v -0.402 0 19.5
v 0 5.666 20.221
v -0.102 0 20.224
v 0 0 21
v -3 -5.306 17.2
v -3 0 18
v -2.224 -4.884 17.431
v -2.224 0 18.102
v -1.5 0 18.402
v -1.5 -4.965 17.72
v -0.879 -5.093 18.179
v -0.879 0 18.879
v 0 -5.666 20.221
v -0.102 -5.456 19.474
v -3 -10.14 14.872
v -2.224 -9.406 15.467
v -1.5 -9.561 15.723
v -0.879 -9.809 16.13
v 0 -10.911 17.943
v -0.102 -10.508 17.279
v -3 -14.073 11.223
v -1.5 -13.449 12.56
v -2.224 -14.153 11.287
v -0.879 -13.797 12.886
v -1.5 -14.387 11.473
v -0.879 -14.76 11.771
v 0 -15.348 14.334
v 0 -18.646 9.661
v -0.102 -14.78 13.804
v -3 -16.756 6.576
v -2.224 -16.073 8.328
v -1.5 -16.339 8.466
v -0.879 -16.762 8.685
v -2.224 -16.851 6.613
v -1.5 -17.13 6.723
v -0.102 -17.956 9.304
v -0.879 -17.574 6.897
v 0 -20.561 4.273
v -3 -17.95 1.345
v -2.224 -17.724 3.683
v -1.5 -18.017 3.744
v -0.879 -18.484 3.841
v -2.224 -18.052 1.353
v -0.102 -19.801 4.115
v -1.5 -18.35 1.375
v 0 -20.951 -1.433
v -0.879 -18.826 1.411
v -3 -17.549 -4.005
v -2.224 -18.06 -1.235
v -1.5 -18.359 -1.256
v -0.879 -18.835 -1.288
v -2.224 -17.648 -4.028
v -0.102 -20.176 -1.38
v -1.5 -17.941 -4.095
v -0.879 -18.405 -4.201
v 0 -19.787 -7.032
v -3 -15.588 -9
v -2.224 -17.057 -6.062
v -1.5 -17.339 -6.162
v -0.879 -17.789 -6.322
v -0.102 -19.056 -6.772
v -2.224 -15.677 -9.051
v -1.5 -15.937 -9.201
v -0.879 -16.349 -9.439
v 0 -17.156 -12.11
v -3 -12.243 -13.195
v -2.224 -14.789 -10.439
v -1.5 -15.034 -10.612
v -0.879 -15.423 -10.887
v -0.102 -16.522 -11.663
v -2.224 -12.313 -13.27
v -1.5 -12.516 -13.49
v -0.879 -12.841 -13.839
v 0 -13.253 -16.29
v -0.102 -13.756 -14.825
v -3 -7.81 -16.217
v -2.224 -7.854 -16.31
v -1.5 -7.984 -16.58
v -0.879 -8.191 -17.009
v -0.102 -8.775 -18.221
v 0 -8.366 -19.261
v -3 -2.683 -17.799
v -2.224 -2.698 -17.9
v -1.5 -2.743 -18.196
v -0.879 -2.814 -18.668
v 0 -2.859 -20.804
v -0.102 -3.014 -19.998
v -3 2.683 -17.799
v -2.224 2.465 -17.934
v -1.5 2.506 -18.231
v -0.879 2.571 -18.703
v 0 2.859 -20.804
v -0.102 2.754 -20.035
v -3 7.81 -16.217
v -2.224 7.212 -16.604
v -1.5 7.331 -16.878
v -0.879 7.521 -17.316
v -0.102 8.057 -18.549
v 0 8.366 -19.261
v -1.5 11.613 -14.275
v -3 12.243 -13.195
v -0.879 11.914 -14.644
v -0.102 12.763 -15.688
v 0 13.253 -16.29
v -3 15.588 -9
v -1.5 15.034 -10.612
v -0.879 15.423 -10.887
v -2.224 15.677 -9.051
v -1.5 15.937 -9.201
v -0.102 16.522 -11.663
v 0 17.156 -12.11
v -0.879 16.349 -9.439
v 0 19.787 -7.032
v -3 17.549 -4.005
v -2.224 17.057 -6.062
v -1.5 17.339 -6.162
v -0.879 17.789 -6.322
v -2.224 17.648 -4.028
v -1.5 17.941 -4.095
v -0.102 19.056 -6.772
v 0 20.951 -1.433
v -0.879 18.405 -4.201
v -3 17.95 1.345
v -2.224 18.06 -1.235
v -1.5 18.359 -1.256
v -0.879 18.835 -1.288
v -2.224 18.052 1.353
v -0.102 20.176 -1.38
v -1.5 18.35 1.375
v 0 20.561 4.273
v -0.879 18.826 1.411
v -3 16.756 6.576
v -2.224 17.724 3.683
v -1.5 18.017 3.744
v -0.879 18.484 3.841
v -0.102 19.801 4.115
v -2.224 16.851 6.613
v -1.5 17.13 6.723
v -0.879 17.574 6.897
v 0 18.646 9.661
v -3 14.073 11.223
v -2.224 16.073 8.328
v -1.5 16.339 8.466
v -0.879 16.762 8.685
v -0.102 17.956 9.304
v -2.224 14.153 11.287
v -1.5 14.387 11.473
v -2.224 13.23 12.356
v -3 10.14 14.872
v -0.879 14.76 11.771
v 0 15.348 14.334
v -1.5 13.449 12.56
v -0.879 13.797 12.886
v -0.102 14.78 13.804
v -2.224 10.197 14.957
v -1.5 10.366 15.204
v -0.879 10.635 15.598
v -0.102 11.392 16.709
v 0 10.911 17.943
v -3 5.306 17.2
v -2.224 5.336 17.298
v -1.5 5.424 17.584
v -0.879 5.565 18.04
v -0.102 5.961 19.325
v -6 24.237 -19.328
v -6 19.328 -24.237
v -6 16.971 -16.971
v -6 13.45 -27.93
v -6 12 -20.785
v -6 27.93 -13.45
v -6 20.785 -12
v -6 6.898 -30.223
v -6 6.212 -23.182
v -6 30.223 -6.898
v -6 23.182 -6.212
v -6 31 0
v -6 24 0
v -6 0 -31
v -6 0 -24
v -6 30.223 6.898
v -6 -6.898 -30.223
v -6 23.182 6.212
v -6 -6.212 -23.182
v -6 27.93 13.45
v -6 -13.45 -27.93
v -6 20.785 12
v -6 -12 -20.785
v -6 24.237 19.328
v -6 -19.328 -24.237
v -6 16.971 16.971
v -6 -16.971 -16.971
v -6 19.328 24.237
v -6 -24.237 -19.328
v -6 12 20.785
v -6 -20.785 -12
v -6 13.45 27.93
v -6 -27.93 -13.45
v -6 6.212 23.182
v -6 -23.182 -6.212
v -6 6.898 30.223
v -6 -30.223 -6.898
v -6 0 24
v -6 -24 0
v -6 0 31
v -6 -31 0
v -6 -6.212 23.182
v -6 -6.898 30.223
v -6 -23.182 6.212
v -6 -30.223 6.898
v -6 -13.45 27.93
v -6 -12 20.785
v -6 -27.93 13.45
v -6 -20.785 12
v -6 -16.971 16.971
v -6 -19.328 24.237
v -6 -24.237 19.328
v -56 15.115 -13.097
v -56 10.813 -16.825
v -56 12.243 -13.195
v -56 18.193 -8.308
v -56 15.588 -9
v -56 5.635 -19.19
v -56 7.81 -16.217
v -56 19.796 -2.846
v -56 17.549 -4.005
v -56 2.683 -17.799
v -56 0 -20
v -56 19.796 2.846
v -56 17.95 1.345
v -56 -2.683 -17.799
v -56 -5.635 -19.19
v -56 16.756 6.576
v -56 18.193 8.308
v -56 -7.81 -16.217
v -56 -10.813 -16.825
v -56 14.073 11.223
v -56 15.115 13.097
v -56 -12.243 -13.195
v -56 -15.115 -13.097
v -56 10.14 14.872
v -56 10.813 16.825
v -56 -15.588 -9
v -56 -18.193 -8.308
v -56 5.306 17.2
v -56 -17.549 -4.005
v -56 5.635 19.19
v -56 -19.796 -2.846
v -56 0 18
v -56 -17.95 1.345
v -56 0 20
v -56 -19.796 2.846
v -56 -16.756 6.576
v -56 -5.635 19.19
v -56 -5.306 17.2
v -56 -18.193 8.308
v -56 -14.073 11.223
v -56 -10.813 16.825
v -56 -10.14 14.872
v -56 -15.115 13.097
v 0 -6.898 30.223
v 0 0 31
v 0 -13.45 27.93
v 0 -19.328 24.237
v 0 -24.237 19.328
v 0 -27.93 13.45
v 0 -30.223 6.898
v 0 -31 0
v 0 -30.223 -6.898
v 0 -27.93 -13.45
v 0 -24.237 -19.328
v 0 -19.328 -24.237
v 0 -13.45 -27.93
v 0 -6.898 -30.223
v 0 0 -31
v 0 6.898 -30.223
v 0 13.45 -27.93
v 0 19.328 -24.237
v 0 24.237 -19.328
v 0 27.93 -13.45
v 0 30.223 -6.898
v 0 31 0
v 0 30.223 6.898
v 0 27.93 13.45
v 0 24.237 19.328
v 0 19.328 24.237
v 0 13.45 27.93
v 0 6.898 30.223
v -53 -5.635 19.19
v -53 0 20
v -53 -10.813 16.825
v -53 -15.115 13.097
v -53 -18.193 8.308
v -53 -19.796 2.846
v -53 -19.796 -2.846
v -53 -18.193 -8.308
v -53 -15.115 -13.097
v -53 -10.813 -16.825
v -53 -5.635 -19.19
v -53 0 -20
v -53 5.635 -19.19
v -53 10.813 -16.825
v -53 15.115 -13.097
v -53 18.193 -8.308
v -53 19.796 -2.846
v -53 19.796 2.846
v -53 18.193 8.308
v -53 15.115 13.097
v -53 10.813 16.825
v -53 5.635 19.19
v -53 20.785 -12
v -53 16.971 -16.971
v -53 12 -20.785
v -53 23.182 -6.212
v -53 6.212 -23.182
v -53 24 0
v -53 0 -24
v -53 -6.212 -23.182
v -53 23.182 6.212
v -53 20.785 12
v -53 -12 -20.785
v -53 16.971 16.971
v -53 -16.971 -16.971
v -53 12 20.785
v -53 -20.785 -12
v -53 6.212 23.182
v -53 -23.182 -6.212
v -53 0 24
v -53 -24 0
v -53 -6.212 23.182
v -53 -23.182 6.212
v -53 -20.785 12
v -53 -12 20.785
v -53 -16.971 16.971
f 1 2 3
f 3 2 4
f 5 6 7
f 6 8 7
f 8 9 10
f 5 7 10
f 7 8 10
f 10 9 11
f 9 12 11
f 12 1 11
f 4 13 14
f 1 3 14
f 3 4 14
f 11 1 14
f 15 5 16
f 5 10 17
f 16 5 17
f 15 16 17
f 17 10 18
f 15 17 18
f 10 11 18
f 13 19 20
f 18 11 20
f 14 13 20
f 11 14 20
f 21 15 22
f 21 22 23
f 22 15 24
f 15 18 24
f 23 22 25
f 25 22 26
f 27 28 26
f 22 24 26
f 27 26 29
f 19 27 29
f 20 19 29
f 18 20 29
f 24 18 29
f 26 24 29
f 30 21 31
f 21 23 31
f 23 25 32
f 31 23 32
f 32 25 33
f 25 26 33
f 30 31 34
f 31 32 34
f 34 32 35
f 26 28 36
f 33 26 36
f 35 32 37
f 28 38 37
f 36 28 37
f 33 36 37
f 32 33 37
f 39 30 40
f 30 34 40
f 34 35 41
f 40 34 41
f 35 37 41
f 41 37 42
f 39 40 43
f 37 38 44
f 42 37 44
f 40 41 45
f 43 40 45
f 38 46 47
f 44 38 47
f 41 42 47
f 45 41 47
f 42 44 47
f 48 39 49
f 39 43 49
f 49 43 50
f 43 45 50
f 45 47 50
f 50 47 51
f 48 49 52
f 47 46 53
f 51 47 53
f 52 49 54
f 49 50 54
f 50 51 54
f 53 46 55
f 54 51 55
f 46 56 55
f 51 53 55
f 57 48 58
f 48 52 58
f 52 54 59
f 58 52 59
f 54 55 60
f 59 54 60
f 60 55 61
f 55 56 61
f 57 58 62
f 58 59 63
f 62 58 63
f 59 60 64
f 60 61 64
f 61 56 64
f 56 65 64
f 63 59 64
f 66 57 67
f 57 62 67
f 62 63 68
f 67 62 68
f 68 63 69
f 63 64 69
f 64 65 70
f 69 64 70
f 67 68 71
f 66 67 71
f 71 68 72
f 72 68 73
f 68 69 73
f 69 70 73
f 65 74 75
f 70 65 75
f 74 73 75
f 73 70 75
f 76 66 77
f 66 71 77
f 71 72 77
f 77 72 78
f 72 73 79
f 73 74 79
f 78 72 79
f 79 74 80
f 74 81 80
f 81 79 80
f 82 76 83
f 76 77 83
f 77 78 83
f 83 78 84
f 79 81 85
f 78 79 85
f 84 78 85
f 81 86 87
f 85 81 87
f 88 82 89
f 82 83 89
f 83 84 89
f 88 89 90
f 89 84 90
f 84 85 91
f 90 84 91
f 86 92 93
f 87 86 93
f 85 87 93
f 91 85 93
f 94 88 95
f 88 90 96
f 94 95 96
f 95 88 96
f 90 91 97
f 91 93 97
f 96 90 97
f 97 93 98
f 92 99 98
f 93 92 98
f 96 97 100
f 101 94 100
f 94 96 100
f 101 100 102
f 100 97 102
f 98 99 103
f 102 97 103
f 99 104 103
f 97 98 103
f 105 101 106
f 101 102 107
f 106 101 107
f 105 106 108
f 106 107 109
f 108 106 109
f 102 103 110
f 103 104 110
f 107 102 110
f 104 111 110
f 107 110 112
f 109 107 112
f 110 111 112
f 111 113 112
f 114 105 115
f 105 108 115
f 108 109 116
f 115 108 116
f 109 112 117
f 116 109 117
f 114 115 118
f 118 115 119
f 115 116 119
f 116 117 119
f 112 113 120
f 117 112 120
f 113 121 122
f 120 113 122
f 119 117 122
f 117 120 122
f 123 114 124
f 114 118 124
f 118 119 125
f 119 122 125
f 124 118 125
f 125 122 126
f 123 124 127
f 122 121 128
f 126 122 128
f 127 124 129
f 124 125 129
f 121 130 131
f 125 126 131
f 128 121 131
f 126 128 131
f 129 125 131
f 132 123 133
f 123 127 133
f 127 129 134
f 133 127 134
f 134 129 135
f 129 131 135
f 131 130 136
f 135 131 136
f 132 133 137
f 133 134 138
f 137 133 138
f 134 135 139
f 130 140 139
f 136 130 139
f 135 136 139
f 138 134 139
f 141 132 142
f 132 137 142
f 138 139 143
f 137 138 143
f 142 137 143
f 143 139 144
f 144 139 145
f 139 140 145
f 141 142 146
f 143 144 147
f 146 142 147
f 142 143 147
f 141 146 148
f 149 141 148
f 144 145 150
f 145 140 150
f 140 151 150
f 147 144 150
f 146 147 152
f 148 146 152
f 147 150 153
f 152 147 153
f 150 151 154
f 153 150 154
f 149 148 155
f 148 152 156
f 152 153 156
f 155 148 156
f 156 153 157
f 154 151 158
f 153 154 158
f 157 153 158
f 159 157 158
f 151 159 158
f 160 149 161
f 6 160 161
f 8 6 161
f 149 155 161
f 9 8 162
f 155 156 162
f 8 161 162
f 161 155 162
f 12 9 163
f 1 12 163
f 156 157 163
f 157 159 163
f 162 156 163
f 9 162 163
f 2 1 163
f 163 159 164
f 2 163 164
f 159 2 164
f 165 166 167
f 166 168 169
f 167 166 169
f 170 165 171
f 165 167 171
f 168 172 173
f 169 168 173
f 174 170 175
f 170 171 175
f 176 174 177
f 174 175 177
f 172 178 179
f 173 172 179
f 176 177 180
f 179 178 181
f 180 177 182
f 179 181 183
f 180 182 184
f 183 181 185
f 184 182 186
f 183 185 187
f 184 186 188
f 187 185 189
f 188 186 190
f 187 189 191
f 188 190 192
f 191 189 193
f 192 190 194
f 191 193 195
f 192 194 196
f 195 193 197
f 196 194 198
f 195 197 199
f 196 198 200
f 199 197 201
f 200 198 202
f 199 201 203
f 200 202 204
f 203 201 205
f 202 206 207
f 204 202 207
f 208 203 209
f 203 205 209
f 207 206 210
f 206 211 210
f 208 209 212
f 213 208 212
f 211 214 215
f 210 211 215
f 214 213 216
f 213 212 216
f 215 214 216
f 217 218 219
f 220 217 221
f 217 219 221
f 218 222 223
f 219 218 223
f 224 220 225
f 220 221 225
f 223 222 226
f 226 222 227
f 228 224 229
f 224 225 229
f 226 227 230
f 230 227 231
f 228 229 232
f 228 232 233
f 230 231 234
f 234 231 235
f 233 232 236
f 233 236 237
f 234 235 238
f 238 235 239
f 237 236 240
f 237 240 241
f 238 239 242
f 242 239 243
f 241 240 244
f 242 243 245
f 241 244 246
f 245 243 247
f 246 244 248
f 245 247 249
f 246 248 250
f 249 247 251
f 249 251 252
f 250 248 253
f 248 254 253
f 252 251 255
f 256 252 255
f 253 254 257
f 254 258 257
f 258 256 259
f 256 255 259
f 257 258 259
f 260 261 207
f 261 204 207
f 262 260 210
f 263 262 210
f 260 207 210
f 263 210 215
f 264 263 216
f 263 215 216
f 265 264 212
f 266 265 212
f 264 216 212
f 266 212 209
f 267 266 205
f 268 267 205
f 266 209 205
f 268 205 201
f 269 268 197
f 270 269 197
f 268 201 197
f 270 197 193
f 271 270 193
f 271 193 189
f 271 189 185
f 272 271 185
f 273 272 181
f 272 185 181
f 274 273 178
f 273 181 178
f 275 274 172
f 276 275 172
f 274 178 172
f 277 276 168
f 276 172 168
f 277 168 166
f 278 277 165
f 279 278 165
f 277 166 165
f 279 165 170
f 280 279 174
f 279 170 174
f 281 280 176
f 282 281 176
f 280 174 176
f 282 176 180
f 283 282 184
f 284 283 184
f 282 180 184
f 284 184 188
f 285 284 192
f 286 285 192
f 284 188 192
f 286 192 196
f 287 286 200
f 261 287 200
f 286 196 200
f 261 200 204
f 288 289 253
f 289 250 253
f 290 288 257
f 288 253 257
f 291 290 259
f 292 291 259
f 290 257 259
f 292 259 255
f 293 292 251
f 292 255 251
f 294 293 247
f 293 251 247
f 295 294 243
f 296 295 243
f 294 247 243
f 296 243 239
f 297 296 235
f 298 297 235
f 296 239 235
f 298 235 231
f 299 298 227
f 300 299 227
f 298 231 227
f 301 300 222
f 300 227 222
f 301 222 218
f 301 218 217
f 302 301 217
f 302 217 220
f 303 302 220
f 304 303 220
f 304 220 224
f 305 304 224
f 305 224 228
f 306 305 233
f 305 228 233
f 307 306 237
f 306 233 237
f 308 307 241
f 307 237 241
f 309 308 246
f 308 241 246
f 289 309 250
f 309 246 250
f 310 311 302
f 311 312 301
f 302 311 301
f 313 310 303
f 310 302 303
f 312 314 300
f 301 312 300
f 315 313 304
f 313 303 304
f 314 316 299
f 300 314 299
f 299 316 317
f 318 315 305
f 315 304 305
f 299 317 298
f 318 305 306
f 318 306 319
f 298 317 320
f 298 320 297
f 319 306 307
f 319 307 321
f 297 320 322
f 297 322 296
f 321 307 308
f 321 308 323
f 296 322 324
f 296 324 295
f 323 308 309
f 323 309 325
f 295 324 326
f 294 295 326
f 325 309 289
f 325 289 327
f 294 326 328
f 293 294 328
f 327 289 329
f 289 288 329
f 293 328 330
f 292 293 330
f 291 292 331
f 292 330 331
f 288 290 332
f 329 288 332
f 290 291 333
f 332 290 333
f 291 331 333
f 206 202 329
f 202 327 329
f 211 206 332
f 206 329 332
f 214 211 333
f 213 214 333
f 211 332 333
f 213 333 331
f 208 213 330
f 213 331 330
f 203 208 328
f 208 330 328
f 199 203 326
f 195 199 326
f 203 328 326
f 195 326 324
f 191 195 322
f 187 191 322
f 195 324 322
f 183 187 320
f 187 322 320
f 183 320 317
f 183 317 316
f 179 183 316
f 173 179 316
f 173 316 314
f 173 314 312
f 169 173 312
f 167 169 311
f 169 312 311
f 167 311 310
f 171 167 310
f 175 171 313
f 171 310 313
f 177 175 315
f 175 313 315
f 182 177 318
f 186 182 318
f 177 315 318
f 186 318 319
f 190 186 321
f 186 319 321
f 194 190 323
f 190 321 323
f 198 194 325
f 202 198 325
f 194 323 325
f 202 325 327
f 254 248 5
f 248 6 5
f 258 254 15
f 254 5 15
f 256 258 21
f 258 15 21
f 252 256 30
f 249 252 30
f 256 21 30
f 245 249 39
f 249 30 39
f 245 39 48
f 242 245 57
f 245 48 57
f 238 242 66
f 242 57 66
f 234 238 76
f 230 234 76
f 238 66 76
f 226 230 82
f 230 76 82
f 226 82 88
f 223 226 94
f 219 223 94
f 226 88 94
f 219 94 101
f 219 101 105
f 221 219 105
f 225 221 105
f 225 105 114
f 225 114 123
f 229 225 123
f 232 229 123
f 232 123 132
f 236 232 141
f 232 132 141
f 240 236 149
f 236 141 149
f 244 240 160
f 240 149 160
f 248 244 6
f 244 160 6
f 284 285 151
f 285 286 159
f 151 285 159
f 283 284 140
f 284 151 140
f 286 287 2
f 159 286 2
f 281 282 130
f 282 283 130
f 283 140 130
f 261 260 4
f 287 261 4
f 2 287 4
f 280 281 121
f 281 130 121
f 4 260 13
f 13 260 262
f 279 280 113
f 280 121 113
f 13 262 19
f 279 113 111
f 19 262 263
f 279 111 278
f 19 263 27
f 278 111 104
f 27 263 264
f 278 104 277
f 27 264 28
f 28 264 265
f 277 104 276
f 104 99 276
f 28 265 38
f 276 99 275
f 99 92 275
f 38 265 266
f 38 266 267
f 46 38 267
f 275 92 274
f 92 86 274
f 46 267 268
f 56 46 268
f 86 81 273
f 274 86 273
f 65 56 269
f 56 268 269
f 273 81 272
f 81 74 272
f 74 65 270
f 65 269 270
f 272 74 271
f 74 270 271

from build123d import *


with BuildPart() as part:
    # Esquisse1 → Base-Révolution (revolve)
    with BuildSketch(Plane.XY):
        with BuildLine():
            Line((-56, 18), (-3, 18))
            ThreePointArc((-3, 18), (-0.878679656, 18.878679656), (0, 21))
            Line((0, 21), (0, 31))
            Line((0, 31), (-6, 31))
            Line((-6, 31), (-6, 24))
            Line((-6, 24), (-53, 24))
            Line((-53, 24), (-53, 20))
            Line((-53, 20), (-56, 20))
            Line((-56, 20), (-56, 18))
        make_face()
    revolve(axis=Axis((-50.685125628, 0, 0), (1, 0, 0)))


solid = part.part
